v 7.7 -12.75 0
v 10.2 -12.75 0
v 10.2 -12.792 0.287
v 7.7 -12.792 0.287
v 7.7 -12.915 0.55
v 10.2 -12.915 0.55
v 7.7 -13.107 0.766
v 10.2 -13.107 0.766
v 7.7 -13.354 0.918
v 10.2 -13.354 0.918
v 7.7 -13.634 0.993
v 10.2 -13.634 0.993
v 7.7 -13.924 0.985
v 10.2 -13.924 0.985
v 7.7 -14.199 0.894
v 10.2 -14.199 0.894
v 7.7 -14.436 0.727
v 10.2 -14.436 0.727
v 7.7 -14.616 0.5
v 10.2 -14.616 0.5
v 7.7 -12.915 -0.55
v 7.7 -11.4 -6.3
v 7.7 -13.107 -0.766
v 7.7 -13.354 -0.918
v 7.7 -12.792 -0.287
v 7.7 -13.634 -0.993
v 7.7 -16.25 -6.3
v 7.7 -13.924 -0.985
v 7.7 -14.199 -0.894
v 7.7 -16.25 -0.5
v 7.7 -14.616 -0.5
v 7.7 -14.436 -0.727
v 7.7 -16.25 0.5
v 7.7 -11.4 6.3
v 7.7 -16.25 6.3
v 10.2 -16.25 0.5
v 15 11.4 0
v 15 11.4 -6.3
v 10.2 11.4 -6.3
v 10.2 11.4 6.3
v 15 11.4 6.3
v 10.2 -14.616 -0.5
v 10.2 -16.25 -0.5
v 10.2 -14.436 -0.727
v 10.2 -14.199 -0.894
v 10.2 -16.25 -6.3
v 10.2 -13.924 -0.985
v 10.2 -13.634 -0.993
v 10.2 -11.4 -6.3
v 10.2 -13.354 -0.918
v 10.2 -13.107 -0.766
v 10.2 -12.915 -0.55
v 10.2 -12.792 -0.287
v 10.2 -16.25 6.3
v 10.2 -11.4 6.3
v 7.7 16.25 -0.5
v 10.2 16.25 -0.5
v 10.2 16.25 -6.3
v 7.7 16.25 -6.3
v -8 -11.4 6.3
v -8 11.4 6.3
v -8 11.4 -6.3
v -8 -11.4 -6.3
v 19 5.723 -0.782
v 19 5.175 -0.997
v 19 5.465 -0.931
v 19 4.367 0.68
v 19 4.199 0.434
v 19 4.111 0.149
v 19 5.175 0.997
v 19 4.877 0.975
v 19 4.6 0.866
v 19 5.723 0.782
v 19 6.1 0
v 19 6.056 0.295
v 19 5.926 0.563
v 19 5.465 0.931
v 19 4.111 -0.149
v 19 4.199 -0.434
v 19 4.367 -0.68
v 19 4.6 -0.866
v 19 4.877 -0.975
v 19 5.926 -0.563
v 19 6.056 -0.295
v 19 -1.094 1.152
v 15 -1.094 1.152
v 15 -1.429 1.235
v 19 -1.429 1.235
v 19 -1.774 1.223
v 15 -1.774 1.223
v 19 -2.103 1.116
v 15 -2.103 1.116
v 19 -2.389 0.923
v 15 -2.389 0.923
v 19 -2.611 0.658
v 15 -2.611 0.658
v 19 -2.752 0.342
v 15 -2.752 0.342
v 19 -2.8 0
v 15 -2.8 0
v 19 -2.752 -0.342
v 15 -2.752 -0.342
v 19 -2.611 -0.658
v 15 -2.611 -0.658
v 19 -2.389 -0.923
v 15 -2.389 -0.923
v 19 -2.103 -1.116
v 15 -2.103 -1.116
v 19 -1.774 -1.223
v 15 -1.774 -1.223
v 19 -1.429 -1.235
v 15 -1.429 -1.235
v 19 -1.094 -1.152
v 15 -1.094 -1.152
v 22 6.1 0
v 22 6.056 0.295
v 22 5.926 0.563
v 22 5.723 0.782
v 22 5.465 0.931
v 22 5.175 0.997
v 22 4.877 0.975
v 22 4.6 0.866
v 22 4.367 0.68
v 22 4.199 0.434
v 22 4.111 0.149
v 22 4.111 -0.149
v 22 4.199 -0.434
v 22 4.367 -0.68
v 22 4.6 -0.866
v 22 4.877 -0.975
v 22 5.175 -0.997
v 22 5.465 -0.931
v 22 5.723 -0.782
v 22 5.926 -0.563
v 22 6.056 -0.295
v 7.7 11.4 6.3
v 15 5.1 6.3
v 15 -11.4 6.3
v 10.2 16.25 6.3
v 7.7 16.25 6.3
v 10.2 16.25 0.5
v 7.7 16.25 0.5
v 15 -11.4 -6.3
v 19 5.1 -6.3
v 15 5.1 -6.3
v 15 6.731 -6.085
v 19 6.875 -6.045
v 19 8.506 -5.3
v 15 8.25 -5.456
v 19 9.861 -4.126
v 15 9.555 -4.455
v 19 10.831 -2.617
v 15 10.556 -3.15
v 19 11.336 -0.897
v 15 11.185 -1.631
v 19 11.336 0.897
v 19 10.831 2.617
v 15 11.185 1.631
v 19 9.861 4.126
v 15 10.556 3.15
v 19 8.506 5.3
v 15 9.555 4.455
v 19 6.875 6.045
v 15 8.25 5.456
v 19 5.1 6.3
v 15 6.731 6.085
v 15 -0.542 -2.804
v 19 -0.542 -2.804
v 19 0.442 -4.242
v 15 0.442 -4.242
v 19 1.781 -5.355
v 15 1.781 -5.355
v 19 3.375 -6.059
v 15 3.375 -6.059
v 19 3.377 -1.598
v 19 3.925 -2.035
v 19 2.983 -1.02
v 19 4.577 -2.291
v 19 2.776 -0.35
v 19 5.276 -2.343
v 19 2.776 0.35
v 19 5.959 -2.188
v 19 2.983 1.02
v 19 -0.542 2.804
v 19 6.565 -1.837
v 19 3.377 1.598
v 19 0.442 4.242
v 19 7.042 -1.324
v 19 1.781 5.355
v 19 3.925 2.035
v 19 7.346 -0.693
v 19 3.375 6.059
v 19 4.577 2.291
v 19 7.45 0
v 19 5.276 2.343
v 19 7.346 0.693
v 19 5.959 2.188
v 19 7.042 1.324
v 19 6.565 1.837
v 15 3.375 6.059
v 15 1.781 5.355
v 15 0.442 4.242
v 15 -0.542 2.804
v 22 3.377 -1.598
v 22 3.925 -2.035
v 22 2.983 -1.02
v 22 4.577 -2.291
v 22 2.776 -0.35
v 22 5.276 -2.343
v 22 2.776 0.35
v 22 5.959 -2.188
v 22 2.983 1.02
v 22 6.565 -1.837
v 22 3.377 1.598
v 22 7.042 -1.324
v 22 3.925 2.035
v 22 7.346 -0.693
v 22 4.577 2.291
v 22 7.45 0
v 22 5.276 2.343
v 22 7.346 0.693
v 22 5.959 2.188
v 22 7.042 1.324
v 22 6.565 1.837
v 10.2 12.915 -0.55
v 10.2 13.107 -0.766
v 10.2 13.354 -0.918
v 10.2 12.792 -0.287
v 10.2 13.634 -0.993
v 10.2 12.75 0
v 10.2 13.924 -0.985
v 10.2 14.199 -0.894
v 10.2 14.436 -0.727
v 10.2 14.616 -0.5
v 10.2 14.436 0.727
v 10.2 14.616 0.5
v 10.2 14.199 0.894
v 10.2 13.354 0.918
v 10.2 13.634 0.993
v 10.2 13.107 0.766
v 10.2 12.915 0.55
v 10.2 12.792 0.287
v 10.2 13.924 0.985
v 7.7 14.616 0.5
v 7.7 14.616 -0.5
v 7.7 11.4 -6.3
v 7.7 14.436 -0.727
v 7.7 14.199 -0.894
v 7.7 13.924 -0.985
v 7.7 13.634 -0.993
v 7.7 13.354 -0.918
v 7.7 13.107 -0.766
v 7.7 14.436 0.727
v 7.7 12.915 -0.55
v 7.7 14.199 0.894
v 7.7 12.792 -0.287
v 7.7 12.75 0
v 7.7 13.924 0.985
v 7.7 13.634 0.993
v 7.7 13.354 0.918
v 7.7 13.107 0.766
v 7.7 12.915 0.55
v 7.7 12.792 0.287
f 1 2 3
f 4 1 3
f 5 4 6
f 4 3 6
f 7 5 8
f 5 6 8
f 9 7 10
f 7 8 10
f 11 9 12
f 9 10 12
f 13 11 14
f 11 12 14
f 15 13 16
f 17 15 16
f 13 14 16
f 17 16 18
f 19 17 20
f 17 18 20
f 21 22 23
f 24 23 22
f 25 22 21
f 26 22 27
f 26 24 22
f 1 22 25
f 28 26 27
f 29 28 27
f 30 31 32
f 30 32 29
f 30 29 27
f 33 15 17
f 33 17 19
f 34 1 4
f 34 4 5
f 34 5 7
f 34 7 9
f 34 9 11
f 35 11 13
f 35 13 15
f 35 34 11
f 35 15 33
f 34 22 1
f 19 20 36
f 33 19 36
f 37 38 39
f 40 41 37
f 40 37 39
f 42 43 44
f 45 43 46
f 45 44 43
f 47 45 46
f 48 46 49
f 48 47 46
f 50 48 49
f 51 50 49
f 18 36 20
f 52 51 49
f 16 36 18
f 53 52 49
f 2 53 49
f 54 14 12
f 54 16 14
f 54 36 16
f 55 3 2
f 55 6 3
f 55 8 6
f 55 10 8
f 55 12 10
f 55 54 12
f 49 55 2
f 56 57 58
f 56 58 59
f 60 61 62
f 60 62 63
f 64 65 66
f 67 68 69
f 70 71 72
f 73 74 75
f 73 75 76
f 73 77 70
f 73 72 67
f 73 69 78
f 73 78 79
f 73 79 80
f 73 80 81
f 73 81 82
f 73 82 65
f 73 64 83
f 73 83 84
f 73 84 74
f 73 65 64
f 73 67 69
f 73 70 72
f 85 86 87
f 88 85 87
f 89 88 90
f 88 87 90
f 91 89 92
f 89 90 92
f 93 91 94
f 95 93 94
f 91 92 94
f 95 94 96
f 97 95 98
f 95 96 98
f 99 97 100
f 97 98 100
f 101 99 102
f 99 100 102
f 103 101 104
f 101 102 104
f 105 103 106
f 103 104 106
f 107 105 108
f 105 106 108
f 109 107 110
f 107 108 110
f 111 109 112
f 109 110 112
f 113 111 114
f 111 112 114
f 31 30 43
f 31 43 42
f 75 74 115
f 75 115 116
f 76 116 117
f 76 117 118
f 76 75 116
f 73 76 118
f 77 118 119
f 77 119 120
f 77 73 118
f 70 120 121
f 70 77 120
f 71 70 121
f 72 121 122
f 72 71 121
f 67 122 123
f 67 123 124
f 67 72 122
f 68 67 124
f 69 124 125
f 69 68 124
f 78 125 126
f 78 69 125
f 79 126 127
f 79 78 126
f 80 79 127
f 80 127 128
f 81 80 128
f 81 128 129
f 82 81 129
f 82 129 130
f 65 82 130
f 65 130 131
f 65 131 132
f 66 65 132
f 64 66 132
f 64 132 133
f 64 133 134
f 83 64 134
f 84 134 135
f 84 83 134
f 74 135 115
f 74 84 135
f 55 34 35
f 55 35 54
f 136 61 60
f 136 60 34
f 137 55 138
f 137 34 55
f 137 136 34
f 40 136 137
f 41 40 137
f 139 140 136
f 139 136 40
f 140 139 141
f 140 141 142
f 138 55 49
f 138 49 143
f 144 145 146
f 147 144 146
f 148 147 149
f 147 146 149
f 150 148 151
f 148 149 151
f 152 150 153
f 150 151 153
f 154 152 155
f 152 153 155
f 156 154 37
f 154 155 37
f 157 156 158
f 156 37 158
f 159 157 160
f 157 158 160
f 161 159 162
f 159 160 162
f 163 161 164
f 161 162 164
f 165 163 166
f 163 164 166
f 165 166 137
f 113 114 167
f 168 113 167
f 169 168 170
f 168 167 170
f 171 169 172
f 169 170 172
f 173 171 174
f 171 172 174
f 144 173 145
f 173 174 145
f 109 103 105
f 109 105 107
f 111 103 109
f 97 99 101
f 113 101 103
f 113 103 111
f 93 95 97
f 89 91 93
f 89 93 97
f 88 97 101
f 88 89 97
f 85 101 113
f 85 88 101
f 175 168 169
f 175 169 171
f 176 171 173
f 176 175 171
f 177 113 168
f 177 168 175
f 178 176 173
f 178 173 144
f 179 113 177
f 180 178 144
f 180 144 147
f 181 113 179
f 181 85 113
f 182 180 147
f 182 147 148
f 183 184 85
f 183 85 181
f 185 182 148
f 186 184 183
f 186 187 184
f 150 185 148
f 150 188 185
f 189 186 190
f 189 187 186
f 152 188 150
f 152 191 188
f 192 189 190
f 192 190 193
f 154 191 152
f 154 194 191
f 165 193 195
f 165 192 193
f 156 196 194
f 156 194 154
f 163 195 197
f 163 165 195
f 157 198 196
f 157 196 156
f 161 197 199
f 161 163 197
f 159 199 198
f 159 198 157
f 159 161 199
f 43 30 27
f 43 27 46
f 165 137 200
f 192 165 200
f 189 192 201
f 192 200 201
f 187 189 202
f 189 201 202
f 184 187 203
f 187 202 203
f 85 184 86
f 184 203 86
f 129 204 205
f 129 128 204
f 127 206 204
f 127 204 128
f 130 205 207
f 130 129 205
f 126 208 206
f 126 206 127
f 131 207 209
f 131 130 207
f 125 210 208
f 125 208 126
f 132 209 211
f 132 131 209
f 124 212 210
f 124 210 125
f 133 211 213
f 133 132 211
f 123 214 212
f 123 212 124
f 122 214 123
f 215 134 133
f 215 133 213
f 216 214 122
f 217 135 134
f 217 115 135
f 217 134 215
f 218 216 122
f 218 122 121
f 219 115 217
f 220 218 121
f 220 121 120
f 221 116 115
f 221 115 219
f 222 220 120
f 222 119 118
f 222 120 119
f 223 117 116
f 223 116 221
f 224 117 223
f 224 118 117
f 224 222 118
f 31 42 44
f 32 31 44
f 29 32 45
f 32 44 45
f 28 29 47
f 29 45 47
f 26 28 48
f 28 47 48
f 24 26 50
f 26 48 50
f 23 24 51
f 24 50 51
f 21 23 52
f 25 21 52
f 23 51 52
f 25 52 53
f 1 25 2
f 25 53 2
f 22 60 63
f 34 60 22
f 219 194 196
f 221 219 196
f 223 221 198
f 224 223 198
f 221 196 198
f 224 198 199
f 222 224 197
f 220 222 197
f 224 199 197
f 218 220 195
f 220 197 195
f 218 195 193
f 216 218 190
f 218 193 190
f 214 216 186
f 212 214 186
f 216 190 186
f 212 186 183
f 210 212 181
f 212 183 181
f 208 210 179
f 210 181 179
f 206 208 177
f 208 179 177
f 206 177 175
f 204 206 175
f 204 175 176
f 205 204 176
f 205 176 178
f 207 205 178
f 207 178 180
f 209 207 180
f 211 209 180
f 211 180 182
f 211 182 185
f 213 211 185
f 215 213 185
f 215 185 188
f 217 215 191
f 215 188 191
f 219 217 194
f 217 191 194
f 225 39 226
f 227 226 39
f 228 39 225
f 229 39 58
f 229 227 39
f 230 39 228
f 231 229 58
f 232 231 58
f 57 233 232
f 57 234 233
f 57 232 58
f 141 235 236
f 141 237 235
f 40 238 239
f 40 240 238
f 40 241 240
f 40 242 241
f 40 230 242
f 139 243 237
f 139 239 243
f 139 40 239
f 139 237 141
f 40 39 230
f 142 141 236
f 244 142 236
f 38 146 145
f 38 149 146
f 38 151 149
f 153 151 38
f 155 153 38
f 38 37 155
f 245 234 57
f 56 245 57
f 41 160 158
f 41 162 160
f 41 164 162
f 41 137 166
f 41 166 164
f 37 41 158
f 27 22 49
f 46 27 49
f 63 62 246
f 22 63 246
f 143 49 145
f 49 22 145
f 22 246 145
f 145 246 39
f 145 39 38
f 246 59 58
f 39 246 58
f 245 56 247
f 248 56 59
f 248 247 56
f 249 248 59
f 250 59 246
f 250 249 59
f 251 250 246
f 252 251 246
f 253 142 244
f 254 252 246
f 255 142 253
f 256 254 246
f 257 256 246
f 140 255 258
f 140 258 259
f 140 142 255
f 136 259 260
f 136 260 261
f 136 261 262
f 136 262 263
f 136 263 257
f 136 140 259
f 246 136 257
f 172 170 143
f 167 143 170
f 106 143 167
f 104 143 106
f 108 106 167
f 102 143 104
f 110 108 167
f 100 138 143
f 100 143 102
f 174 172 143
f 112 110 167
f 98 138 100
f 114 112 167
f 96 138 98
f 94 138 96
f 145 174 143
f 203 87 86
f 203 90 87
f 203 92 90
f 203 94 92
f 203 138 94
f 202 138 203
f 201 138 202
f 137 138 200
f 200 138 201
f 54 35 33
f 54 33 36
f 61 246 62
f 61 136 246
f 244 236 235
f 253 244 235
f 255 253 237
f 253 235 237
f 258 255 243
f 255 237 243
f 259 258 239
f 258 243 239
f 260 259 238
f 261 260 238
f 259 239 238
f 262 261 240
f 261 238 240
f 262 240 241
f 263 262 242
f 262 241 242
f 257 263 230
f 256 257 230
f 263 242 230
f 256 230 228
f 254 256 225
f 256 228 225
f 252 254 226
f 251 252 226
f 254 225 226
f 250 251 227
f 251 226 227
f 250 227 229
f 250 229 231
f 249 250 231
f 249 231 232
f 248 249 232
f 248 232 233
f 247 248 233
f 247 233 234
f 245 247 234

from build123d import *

# Parameters (mm, degrees)
F1_DEPTH = 6.3
F3_DEPTH = 4
F4_R     = 2.35
F4_R_2   = 1
F5_DEPTH = 3
F7_DEPTH = 2.5


with BuildPart() as f1:
    # F0 (on Top) → F1 (new body, symmetric)
    with BuildSketch(Plane.XY):
        Polygon((7.7, 11.4), (-8, 11.4), (-8, -11.4), (7.7, -11.4), (7.7, -16.25), (10.2, -16.25), (10.2, -11.4), (15, -11.4), (15, 11.4), (10.2, 11.4), (10.2, 16.25), (7.7, 16.25), align=None)
    extrude(amount=F1_DEPTH, both=True)

    # F2 (on face) → F3 (join)
    with BuildSketch(Plane.YZ.offset(15)):
        with BuildLine():
            ThreePointArc((5.1, 6.3), (1.0729415714, 4.844873622), (-1.0938378269, 1.1516826707))
            ThreePointArc((-1.0938378269, 1.1516826707), (-1.2, 0), (-1.0938378269, -1.1516826707))
            ThreePointArc((-1.0938378269, -1.1516826707), (1.072941559, -4.8448736116), (5.0999999676, -6.3))
            ThreePointArc((5.0999999676, -6.3), (9.55477271, -4.4547727329), (11.4, 0))
            ThreePointArc((11.4, 0), (9.5547727215, 4.4547727215), (5.1, 6.3))
        make_face()
        with BuildLine():
            ThreePointArc((-1.0938378269, -1.1516826707), (-1.2, 0), (-1.0938378269, 1.1516826707))
            ThreePointArc((-1.0938378269, 1.1516826707), (-2.8, 0), (-1.0938378269, -1.1516826707))
        make_face()
    extrude(amount=F3_DEPTH)

    # F4 (on face) → F5 (join)
    with BuildSketch(Plane.YZ.offset(19)):
        with Locations((5.1, 0)):
            Circle(F4_R)
        with Locations((5.1, 0)):
            Circle(F4_R_2, mode=Mode.SUBTRACT)
    extrude(amount=F5_DEPTH)

    # F6 (on face) → F7 (cut, through all)
    with BuildSketch(Plane.YZ.offset(10.2)):
        with BuildLine():
            ThreePointArc((14.6160254038, -0.5), (14.7159258263, -0.2588190451), (14.75, 0))
            ThreePointArc((14.75, 0), (14.7159258263, 0.2588190451), (14.6160254038, 0.5))
            ThreePointArc((14.6160254038, 0.5), (12.75, 0), (14.6160254038, -0.5))
        make_face()
        with BuildLine():
            ThreePointArc((14.6160254038, 0.5), (14.7159258263, 0.2588190451), (14.75, 0))
            ThreePointArc((14.75, 0), (14.7159258263, -0.2588190451), (14.6160254038, -0.5))
            Line((14.6160254038, -0.5), (16.25, -0.5))
            Line((16.25, -0.5), (16.25, 0.5))
            Line((16.25, 0.5), (14.6160254038, 0.5))
        make_face()
        with BuildLine():
            ThreePointArc((-14.6160254038, -0.5), (-13.4911809549, -0.9659258263), (-12.75, 0))
            ThreePointArc((-12.75, 0), (-13.4911809549, 0.9659258263), (-14.6160254038, 0.5))
            ThreePointArc((-14.6160254038, 0.5), (-14.75, 0), (-14.6160254038, -0.5))
        make_face()
        with BuildLine():
            ThreePointArc((-14.6160254038, -0.5), (-14.75, 0), (-14.6160254038, 0.5))
            Line((-14.6160254038, 0.5), (-16.25, 0.5))
            Line((-16.25, 0.5), (-16.25, -0.5))
            Line((-16.25, -0.5), (-14.6160254038, -0.5))
        make_face()
    extrude(amount=-F7_DEPTH, mode=Mode.SUBTRACT)


solid = f1.part
